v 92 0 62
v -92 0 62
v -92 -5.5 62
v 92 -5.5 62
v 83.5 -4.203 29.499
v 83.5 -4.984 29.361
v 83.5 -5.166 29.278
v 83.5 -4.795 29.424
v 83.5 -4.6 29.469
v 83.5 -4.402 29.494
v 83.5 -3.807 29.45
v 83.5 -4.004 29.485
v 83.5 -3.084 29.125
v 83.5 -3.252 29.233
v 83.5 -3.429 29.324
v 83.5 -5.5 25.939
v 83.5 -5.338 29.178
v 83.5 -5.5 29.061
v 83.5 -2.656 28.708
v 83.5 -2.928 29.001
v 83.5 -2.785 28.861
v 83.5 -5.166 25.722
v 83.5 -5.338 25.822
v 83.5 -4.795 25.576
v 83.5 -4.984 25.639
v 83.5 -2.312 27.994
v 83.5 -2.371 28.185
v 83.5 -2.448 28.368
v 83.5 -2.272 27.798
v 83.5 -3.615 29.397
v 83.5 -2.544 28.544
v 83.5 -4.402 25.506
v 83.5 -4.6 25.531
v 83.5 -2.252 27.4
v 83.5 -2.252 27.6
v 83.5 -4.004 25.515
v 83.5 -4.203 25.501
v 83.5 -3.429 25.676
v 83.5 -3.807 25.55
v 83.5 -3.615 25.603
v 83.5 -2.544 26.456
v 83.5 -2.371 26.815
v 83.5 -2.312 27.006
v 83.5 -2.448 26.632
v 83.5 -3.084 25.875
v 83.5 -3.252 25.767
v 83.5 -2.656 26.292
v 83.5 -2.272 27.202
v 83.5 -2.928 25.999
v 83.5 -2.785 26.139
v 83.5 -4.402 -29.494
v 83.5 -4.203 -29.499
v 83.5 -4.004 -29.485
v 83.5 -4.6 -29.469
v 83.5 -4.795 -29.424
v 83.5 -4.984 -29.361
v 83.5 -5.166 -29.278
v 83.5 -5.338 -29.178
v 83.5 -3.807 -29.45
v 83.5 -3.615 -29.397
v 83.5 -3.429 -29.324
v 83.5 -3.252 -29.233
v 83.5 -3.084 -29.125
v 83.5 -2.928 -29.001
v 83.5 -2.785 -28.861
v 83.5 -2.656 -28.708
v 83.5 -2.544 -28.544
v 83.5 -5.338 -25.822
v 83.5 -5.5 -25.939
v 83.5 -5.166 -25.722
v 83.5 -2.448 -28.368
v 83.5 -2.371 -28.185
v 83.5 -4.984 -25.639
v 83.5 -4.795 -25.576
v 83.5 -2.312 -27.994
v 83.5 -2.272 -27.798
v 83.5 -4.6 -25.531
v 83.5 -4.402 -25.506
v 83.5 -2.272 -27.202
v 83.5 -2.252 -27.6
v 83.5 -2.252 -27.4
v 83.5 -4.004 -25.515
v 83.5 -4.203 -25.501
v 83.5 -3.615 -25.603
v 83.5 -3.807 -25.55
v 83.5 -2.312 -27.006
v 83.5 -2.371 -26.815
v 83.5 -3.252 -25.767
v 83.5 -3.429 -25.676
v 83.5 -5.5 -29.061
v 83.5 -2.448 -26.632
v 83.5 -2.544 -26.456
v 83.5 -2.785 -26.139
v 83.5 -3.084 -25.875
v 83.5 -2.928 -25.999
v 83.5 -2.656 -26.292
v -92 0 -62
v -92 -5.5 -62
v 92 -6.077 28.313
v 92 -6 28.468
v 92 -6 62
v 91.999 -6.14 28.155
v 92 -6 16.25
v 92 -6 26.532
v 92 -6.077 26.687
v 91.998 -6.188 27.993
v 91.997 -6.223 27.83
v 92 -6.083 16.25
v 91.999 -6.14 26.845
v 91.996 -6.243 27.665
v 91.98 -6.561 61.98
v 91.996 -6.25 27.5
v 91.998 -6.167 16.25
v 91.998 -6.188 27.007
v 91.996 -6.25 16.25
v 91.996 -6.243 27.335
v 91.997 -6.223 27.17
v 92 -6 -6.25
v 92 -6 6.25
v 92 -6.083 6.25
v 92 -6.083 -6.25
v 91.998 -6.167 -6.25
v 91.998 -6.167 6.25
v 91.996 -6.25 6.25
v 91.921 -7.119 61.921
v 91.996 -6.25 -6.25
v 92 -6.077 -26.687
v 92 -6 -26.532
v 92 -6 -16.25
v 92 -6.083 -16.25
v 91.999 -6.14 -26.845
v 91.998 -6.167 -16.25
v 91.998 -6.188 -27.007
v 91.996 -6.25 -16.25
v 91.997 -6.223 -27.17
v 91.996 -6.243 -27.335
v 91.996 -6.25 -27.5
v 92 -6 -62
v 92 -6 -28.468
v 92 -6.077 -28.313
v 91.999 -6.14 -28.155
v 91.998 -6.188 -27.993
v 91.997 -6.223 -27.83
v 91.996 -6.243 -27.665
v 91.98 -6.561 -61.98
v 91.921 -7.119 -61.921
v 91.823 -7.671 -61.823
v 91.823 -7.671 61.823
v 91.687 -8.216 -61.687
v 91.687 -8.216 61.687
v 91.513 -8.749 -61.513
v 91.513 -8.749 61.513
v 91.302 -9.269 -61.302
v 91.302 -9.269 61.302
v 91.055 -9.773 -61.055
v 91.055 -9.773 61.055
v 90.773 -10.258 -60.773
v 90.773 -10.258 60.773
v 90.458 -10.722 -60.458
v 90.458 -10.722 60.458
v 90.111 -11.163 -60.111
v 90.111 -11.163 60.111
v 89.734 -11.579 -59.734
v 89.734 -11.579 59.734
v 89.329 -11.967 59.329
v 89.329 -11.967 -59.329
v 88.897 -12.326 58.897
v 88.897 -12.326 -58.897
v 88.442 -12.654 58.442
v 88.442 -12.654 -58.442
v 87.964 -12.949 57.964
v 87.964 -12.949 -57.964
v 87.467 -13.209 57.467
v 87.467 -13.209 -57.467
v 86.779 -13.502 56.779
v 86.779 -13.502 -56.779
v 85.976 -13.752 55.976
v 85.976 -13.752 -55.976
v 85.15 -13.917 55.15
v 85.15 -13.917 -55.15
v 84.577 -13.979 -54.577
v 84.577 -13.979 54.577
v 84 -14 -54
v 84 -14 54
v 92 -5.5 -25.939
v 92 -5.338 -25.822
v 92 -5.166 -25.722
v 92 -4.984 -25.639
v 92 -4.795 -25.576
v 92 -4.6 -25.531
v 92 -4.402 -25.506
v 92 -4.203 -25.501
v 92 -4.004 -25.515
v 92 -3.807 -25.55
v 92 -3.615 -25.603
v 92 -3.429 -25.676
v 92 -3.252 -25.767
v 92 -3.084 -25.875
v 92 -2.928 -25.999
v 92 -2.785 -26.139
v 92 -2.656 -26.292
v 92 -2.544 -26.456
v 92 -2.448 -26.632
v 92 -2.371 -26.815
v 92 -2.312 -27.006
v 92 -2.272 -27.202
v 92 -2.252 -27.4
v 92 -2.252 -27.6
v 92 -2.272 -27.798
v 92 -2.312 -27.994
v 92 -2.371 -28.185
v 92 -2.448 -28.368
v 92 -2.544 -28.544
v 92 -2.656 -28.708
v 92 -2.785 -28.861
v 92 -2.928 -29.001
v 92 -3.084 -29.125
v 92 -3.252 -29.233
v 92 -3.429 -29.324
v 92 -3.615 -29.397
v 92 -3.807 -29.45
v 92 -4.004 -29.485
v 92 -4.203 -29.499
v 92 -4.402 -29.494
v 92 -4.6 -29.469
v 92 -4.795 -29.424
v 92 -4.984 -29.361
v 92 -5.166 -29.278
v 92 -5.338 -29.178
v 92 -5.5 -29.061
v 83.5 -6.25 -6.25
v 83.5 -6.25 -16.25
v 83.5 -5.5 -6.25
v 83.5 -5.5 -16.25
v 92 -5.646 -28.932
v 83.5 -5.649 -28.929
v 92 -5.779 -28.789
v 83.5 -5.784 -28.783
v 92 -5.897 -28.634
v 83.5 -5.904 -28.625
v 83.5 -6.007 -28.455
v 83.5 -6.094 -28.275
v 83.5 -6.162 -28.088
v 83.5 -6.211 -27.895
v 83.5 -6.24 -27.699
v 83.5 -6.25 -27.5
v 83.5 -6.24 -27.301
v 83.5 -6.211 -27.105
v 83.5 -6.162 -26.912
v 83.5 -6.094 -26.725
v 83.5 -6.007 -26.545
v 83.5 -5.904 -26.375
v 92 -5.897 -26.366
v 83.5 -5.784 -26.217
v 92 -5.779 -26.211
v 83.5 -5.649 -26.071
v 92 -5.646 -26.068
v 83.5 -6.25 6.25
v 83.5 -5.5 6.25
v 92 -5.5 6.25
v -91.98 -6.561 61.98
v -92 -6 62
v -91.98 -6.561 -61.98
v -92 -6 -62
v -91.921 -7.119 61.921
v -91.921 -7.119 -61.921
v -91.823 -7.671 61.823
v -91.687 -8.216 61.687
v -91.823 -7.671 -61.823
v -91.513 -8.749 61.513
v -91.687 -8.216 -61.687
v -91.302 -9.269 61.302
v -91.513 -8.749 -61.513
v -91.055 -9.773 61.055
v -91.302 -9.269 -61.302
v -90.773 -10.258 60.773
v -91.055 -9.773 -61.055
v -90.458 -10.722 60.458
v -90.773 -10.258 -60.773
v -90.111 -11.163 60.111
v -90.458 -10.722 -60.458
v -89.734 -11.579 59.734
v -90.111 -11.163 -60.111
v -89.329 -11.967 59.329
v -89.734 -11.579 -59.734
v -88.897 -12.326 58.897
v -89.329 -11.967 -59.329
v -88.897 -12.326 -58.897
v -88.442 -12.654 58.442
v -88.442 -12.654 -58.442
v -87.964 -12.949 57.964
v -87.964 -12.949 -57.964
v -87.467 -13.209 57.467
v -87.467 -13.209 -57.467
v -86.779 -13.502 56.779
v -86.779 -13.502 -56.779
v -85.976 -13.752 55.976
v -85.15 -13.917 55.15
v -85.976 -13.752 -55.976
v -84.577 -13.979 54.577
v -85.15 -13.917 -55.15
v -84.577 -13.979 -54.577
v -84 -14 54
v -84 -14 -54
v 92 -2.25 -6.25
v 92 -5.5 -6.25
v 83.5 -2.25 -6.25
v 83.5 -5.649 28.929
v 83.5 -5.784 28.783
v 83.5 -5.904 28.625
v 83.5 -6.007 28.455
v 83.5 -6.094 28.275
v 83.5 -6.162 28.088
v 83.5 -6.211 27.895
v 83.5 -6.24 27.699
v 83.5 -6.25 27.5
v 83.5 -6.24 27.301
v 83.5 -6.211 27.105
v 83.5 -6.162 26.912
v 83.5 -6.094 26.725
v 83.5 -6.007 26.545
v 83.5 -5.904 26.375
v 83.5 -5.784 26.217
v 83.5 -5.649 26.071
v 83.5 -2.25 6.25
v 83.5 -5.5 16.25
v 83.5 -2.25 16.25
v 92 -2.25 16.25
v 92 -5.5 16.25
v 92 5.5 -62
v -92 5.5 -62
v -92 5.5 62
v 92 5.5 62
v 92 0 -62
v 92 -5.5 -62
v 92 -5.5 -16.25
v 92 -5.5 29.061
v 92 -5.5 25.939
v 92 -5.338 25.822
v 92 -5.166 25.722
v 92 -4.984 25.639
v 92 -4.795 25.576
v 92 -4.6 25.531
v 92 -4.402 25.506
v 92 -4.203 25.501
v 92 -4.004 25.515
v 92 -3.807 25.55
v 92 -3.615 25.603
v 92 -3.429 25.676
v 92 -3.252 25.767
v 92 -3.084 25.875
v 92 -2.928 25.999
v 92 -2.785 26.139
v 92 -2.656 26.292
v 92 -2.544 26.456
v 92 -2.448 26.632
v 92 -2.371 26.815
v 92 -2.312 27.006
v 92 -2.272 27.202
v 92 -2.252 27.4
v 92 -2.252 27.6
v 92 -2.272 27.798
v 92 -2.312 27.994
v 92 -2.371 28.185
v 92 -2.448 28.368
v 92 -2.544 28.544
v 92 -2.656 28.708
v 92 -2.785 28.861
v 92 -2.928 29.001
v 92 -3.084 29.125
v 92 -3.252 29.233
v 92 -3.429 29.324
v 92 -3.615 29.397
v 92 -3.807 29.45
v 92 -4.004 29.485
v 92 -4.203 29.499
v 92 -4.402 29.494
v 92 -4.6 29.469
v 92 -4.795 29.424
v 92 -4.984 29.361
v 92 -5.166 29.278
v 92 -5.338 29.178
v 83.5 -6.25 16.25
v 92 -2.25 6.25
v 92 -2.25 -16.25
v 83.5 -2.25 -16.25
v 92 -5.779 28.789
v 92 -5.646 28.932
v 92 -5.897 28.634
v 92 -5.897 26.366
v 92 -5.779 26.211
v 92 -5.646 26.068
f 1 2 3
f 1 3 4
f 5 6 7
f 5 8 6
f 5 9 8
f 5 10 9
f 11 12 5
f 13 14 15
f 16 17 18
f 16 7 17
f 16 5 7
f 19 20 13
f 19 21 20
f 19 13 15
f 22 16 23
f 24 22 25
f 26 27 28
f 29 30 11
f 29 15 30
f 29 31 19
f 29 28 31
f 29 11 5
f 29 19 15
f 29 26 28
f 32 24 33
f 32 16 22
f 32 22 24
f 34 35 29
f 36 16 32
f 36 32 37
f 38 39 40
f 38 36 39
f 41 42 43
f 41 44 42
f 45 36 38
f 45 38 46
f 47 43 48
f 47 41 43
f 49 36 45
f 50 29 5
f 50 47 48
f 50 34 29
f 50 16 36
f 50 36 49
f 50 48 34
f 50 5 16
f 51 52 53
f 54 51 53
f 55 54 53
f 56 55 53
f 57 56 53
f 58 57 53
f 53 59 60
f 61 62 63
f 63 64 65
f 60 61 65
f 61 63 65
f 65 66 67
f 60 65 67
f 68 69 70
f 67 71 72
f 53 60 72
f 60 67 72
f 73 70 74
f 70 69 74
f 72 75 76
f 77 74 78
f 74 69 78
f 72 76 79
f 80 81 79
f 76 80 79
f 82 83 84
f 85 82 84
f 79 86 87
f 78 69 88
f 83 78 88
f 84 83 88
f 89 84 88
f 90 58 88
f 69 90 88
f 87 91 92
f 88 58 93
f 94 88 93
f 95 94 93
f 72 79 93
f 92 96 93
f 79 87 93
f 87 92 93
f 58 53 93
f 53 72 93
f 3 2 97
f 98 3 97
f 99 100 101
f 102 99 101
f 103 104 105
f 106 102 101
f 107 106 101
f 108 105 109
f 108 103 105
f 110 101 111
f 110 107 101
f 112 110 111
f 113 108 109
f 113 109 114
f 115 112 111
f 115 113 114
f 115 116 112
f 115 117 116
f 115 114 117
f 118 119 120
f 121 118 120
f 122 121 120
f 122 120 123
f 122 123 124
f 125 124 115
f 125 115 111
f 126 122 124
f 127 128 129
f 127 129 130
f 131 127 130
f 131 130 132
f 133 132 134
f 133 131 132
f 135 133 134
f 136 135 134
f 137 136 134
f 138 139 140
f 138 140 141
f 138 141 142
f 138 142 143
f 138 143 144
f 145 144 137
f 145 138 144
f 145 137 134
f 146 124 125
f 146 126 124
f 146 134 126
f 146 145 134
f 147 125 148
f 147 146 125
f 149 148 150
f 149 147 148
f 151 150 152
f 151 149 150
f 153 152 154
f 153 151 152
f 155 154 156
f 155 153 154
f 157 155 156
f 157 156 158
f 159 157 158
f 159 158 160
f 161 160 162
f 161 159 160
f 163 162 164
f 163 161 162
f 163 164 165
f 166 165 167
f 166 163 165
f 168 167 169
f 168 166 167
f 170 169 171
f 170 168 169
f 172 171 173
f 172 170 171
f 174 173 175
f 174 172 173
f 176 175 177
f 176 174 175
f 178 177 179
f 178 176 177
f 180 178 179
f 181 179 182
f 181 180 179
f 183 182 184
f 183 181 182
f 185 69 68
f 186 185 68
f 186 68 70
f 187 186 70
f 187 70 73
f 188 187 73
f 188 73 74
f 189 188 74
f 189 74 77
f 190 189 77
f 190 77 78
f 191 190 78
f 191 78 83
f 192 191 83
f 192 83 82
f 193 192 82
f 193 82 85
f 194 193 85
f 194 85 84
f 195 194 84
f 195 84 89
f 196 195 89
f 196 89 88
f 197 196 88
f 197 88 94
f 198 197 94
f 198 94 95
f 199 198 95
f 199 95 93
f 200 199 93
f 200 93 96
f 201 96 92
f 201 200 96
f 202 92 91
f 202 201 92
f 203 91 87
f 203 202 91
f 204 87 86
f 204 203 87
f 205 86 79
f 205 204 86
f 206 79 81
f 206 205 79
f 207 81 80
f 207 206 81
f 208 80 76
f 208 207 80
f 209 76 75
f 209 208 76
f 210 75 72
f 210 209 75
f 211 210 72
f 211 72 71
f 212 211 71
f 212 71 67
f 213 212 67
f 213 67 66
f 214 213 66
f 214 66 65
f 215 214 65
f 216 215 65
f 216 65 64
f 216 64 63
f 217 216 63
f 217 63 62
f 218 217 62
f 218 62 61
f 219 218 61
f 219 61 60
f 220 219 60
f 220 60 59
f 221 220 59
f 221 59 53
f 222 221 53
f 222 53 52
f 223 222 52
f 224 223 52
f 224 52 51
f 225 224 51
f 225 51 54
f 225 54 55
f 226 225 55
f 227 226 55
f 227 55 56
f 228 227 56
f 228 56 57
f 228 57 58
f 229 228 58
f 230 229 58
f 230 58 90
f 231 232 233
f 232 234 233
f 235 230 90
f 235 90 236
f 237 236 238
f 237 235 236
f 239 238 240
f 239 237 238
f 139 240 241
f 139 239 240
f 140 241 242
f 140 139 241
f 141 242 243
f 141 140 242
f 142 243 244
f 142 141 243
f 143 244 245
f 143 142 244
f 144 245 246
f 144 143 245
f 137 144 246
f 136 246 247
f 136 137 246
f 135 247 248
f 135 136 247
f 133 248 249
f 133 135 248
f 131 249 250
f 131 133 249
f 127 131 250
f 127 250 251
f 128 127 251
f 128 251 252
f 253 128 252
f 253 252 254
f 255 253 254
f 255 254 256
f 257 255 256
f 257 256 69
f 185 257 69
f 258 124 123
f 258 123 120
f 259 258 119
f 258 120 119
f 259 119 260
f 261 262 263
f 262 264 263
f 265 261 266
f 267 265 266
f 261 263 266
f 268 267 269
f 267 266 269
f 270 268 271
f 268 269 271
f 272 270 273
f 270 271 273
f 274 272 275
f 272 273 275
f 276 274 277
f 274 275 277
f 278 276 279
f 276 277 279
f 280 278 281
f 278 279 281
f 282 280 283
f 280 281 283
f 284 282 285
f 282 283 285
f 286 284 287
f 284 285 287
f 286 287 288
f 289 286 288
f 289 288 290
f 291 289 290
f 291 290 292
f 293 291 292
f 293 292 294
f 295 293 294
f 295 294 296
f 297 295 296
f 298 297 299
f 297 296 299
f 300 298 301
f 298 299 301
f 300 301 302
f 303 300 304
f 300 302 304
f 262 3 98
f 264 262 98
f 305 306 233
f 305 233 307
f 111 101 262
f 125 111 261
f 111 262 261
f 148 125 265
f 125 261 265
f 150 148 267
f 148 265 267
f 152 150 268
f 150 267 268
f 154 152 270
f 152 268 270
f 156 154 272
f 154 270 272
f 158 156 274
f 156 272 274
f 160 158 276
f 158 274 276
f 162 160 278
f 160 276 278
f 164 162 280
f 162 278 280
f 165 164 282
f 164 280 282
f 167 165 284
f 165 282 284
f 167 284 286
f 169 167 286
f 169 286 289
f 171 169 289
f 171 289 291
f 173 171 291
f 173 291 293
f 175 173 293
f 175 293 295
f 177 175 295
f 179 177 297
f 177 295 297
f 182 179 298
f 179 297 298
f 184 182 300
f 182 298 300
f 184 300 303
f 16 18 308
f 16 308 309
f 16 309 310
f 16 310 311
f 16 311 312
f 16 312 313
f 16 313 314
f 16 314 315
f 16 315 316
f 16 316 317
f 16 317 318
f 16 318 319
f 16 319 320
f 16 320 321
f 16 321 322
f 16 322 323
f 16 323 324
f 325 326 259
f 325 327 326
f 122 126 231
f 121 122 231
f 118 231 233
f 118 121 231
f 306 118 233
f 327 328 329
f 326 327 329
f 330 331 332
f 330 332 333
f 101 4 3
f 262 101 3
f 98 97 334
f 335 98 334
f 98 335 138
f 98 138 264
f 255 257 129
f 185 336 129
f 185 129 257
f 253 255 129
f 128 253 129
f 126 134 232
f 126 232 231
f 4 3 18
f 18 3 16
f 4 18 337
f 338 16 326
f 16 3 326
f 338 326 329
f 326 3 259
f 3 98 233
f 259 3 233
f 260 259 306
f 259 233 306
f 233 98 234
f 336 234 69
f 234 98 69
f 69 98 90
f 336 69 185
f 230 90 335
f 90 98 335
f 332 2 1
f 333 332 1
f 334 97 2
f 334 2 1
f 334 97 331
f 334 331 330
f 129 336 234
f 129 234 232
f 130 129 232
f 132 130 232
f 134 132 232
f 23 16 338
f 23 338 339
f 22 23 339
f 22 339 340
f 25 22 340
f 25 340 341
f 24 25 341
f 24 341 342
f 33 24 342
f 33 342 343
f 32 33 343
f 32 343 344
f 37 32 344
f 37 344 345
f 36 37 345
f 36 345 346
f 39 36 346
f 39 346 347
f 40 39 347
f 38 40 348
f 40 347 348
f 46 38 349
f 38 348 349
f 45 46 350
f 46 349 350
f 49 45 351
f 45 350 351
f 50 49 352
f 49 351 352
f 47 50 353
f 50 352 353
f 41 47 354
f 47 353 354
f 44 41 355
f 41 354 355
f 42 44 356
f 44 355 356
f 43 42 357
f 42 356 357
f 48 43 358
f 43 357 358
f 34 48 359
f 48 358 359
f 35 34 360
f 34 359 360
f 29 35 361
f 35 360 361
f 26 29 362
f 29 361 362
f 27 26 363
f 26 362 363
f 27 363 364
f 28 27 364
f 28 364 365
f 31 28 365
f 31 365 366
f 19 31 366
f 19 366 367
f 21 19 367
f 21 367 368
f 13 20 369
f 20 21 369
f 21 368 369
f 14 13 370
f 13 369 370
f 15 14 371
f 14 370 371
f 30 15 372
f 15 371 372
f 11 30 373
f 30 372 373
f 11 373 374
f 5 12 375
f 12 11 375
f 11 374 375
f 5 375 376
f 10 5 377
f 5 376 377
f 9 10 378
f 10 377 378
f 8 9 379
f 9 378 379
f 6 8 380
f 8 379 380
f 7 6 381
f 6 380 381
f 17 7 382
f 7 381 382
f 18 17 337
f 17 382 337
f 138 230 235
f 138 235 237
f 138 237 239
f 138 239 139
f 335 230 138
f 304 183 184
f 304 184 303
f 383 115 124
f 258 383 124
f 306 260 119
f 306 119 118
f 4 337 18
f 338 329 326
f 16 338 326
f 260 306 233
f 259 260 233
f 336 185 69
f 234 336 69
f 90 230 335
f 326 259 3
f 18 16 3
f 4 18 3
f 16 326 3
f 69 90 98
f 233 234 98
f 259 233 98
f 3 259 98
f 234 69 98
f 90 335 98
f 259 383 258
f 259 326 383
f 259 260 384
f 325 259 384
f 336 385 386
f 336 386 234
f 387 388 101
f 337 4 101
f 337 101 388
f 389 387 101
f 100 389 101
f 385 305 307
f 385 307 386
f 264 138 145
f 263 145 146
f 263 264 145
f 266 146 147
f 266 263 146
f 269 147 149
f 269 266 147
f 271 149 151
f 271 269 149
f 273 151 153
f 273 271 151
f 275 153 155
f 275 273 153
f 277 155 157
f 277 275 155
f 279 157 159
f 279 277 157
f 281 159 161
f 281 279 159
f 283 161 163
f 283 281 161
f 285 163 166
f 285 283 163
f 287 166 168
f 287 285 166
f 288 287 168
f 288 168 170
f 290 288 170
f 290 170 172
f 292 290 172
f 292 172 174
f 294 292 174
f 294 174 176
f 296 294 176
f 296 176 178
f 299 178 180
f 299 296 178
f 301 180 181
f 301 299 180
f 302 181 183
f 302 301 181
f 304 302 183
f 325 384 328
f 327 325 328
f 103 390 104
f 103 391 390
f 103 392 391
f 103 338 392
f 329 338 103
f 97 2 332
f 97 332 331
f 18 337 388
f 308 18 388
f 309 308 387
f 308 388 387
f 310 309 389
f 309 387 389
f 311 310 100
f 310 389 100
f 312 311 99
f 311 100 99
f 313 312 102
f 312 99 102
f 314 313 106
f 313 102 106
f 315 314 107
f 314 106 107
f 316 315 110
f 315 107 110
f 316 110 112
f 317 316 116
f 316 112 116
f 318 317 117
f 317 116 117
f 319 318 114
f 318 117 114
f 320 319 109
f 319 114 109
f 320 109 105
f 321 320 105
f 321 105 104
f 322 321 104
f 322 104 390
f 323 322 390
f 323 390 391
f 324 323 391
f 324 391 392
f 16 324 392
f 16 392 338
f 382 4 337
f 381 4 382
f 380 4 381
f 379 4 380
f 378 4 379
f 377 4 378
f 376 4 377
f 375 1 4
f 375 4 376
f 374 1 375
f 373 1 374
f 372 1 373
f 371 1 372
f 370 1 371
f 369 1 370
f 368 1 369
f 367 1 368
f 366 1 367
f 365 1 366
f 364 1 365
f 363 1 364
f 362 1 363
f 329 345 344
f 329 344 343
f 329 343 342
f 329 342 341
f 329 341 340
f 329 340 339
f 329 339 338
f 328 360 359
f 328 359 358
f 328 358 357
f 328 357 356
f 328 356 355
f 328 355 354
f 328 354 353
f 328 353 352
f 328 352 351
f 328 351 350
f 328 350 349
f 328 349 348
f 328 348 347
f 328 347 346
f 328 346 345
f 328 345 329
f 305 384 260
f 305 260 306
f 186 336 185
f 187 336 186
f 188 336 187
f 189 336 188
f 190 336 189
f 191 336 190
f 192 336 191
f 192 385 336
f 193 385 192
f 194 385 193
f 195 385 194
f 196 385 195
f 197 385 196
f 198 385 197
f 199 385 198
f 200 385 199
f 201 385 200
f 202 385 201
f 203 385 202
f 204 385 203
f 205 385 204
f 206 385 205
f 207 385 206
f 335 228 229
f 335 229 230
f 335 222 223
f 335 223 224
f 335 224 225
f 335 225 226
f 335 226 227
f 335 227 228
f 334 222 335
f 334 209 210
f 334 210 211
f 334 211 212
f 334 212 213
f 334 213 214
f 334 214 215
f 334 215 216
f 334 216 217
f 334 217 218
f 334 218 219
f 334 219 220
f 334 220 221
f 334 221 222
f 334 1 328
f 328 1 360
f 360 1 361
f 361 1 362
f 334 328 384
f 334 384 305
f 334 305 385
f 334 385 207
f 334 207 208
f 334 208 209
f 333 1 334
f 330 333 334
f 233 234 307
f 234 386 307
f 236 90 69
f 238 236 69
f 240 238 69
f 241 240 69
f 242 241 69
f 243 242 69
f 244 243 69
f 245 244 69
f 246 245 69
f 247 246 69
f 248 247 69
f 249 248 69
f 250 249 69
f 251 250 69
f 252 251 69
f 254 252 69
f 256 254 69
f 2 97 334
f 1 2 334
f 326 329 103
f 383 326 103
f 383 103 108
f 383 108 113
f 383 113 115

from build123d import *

# Parameters (mm, degrees)
SKETCH1_W           = 184
SKETCH1_H           = 124
BOSS_EXTRUDE1_DEPTH = 5.5
SKETCH1_2_W         = 184
SKETCH1_2_H         = 124
BOSS_EXTRUDE2_DEPTH = 5.5
SKETCH2_W           = 184
SKETCH2_H           = 124
BOSS_EXTRUDE3_DEPTH = 8.5
FILLET1_R           = 8
SKETCH3_W           = 10
SKETCH3_H           = 4
SKETCH3_R           = 2
CUT_EXTRUDE1_DEPTH  = 8.5


with BuildPart() as part:
    # Sketch1 → Boss-Extrude1 (new body)
    with BuildSketch(Plane(origin=(0, 0, 0), x_dir=(1, 0, 0), z_dir=(0, 1, 0))):
        Rectangle(SKETCH1_W, SKETCH1_H)
    extrude(amount=BOSS_EXTRUDE1_DEPTH)


with BuildPart() as body_2:
    # Sketch1<2> → Boss-Extrude2 (new body)
    with BuildSketch(Plane(origin=(0, 0, 0), x_dir=(1, 0, 0), z_dir=(0, 1, 0))):
        Rectangle(SKETCH1_2_W, SKETCH1_2_H)
    extrude(amount=-BOSS_EXTRUDE2_DEPTH)


with BuildPart() as body_3:
    # Sketch2 → Boss-Extrude3 (new body)
    with BuildSketch(Plane(origin=(0, -5.5, 0), x_dir=(-1, 0, 0), z_dir=(0, -1, 0))):
        Rectangle(SKETCH2_W, SKETCH2_H)
    extrude(amount=BOSS_EXTRUDE3_DEPTH)

    # Fillet1
    fillet1_edges = [body_3.edges().sort_by_distance(p)[0] for p in [
        (92, -14, 0),
        (0, -14, 62),
        (-92, -14, 0),
        (0, -14, -62),
    ]]
    fillet(fillet1_edges, radius=FILLET1_R)


with BuildPart() as cut_extrude1_tool:
    # Sketch3 → Cut-Extrude1 (new body)
    with BuildSketch(Plane(origin=(92, 0, 0), x_dir=(0, 0, -1), z_dir=(1, 0, 0))):
        with Locations((-11.25, -4.25)):
            Rectangle(SKETCH3_W, SKETCH3_H)
        with Locations((-27.5, -4.25)):
            Circle(SKETCH3_R)
    cut_extrude1 = extrude(amount=-CUT_EXTRUDE1_DEPTH)


with BuildPart() as body_2_1:
    add(body_2.part)

    # Cut-Extrude1: cut by cut_extrude1_tool
    add(cut_extrude1_tool.part, mode=Mode.SUBTRACT)


with BuildPart() as body_3_1:
    add(body_3.part)

    # Cut-Extrude1: cut by cut_extrude1_tool
    add(cut_extrude1_tool.part, mode=Mode.SUBTRACT)


with BuildPart() as mirror1_tool:
    # Mirror1: Cut-Extrude1 across plane
    add(cut_extrude1.mirror(Plane.XY))


with BuildPart() as body_2_2:
    add(body_2_1.part)

    # Mirror1: cut by mirror1_tool
    add(mirror1_tool.part, mode=Mode.SUBTRACT)


with BuildPart() as body_3_2:
    add(body_3_1.part)

    # Mirror1: cut by mirror1_tool
    add(mirror1_tool.part, mode=Mode.SUBTRACT)


solid = Compound([part.part, body_2_2.part, body_3_2.part])
